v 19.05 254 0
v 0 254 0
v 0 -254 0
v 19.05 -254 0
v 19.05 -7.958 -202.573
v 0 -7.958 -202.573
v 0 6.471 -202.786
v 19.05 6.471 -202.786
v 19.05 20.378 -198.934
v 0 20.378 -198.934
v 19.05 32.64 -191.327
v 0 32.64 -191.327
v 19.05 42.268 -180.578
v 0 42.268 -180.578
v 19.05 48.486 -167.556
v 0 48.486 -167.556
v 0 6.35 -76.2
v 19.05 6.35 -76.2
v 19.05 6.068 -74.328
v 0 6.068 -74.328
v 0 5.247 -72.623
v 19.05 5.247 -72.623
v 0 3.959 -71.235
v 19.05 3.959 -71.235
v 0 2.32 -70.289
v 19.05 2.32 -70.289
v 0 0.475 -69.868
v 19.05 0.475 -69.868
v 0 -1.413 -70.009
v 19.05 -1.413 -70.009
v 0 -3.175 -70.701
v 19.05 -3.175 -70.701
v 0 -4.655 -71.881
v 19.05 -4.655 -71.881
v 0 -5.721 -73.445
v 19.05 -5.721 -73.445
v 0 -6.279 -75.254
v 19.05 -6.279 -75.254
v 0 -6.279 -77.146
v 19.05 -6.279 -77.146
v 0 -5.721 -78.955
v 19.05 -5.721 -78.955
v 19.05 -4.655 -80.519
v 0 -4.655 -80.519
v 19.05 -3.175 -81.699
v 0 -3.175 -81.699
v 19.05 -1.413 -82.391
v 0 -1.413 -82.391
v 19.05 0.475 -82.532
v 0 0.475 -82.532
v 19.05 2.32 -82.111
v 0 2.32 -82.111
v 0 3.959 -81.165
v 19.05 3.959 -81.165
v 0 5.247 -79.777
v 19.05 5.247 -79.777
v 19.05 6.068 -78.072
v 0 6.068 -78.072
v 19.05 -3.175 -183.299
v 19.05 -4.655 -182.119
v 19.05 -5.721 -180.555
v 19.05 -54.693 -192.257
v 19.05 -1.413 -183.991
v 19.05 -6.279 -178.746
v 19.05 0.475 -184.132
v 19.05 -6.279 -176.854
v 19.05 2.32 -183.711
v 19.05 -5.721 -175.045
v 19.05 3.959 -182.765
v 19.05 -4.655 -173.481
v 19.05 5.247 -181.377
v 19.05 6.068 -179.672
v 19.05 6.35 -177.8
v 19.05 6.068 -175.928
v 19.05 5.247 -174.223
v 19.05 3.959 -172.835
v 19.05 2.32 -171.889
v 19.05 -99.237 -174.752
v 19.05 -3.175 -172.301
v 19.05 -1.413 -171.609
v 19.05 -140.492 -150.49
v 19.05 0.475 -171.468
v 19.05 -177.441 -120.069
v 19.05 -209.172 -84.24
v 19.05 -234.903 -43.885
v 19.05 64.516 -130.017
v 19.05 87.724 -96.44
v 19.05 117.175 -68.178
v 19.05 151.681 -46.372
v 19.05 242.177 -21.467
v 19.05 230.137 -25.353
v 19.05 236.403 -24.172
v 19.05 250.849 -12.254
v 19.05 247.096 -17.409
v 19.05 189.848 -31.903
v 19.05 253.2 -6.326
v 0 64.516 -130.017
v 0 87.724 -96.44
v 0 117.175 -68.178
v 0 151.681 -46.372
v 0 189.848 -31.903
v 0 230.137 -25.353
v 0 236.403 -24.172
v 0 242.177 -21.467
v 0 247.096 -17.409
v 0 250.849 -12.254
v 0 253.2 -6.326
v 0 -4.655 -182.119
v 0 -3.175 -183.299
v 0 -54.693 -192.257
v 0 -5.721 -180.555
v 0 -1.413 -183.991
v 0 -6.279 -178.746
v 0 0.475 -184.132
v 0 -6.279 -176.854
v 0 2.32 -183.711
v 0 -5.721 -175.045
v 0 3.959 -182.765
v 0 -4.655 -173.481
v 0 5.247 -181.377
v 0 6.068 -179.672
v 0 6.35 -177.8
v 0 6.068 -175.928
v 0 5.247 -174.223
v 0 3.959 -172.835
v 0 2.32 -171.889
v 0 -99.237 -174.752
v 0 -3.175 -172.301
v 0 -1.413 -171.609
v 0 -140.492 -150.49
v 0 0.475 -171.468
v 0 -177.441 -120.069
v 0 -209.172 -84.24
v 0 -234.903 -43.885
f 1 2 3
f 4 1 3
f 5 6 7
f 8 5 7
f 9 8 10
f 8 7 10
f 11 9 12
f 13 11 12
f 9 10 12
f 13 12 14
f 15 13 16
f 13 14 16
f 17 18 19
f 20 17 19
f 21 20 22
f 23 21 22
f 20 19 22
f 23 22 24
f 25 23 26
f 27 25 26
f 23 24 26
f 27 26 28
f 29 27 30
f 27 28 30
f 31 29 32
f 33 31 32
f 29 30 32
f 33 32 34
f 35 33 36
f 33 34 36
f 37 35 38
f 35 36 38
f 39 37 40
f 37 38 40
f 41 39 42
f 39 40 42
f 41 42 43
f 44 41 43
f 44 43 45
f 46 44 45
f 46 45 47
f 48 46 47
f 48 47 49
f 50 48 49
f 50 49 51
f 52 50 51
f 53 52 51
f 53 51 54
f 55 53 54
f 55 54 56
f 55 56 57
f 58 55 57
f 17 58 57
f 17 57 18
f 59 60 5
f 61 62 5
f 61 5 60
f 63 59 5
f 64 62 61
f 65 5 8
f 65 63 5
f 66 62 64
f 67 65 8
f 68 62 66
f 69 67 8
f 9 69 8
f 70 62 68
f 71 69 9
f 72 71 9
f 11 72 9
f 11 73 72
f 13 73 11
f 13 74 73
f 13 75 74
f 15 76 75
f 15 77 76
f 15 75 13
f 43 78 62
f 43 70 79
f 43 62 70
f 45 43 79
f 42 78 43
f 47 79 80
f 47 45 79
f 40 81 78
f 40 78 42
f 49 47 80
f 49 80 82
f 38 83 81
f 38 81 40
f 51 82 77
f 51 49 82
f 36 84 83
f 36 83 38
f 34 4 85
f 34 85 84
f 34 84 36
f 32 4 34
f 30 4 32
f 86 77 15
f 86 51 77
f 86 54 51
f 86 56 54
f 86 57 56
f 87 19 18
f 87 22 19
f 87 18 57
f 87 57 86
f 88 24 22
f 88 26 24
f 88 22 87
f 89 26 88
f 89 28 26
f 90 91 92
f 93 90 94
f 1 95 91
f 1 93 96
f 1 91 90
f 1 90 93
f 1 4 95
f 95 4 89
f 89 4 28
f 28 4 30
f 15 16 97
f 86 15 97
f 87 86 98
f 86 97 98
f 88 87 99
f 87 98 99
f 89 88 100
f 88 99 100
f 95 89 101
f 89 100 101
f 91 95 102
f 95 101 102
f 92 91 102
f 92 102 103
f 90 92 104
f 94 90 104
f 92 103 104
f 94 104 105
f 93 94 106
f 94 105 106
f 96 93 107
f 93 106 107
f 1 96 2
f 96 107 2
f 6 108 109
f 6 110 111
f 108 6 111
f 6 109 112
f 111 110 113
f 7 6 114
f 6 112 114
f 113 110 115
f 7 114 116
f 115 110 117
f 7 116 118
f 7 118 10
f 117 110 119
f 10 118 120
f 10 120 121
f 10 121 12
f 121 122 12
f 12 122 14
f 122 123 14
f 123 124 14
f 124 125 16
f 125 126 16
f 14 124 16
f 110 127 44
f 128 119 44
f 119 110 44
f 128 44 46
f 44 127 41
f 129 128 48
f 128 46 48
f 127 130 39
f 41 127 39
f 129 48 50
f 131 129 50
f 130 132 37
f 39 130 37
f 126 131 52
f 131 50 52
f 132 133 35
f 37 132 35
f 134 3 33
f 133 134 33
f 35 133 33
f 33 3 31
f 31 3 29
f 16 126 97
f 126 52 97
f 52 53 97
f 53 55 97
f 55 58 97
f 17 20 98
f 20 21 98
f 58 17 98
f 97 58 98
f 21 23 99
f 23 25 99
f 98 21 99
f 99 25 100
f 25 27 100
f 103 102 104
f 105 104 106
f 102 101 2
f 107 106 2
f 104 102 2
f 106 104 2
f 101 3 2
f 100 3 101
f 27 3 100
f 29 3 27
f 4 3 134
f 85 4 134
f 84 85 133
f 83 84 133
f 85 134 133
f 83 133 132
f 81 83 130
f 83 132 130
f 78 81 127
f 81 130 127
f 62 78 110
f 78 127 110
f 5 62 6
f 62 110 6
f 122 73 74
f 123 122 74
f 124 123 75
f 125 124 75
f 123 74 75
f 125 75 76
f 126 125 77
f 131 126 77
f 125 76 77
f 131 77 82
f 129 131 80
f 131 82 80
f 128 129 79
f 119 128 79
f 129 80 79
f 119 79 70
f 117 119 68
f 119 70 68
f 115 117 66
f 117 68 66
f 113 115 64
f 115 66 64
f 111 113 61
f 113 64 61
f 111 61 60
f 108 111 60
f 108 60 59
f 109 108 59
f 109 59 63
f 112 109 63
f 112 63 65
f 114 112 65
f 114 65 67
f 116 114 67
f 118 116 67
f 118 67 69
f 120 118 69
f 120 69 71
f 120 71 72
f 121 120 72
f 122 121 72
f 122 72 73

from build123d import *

# Parameters (mm, degrees)
F1_DEPTH = 19.05
F2_R     = 6.35
F3_DEPTH = 19.051


with BuildPart() as f1:
    # F0 (on Right) → F1 (new body)
    with BuildSketch(Plane.YZ):
        with BuildLine():
            ThreePointArc((-254, 0), (-159.564589, -136.006104), (-7.957927, -202.572815))
            ThreePointArc((-7.957927, -202.572815), (26.7802, -195.567823), (48.486376, -167.556231))
            ThreePointArc((48.486376, -167.556231), (117.175368, -68.177885), (230.136876, -25.353462))
            ThreePointArc((230.136876, -25.353462), (247.0959, -17.408667), (254, 0))
            Line((254, 0), (-254, 0))
        make_face()
    extrude(amount=F1_DEPTH)

    # F2 (on face) → F3 (cut, through all)
    with BuildSketch(Plane.YZ.offset(19.05)):
        with Locations((0, -177.8)):
            Circle(F2_R)
        with Locations((0, -76.2)):
            Circle(F2_R)
    extrude(amount=-F3_DEPTH, mode=Mode.SUBTRACT)


solid = f1.part
